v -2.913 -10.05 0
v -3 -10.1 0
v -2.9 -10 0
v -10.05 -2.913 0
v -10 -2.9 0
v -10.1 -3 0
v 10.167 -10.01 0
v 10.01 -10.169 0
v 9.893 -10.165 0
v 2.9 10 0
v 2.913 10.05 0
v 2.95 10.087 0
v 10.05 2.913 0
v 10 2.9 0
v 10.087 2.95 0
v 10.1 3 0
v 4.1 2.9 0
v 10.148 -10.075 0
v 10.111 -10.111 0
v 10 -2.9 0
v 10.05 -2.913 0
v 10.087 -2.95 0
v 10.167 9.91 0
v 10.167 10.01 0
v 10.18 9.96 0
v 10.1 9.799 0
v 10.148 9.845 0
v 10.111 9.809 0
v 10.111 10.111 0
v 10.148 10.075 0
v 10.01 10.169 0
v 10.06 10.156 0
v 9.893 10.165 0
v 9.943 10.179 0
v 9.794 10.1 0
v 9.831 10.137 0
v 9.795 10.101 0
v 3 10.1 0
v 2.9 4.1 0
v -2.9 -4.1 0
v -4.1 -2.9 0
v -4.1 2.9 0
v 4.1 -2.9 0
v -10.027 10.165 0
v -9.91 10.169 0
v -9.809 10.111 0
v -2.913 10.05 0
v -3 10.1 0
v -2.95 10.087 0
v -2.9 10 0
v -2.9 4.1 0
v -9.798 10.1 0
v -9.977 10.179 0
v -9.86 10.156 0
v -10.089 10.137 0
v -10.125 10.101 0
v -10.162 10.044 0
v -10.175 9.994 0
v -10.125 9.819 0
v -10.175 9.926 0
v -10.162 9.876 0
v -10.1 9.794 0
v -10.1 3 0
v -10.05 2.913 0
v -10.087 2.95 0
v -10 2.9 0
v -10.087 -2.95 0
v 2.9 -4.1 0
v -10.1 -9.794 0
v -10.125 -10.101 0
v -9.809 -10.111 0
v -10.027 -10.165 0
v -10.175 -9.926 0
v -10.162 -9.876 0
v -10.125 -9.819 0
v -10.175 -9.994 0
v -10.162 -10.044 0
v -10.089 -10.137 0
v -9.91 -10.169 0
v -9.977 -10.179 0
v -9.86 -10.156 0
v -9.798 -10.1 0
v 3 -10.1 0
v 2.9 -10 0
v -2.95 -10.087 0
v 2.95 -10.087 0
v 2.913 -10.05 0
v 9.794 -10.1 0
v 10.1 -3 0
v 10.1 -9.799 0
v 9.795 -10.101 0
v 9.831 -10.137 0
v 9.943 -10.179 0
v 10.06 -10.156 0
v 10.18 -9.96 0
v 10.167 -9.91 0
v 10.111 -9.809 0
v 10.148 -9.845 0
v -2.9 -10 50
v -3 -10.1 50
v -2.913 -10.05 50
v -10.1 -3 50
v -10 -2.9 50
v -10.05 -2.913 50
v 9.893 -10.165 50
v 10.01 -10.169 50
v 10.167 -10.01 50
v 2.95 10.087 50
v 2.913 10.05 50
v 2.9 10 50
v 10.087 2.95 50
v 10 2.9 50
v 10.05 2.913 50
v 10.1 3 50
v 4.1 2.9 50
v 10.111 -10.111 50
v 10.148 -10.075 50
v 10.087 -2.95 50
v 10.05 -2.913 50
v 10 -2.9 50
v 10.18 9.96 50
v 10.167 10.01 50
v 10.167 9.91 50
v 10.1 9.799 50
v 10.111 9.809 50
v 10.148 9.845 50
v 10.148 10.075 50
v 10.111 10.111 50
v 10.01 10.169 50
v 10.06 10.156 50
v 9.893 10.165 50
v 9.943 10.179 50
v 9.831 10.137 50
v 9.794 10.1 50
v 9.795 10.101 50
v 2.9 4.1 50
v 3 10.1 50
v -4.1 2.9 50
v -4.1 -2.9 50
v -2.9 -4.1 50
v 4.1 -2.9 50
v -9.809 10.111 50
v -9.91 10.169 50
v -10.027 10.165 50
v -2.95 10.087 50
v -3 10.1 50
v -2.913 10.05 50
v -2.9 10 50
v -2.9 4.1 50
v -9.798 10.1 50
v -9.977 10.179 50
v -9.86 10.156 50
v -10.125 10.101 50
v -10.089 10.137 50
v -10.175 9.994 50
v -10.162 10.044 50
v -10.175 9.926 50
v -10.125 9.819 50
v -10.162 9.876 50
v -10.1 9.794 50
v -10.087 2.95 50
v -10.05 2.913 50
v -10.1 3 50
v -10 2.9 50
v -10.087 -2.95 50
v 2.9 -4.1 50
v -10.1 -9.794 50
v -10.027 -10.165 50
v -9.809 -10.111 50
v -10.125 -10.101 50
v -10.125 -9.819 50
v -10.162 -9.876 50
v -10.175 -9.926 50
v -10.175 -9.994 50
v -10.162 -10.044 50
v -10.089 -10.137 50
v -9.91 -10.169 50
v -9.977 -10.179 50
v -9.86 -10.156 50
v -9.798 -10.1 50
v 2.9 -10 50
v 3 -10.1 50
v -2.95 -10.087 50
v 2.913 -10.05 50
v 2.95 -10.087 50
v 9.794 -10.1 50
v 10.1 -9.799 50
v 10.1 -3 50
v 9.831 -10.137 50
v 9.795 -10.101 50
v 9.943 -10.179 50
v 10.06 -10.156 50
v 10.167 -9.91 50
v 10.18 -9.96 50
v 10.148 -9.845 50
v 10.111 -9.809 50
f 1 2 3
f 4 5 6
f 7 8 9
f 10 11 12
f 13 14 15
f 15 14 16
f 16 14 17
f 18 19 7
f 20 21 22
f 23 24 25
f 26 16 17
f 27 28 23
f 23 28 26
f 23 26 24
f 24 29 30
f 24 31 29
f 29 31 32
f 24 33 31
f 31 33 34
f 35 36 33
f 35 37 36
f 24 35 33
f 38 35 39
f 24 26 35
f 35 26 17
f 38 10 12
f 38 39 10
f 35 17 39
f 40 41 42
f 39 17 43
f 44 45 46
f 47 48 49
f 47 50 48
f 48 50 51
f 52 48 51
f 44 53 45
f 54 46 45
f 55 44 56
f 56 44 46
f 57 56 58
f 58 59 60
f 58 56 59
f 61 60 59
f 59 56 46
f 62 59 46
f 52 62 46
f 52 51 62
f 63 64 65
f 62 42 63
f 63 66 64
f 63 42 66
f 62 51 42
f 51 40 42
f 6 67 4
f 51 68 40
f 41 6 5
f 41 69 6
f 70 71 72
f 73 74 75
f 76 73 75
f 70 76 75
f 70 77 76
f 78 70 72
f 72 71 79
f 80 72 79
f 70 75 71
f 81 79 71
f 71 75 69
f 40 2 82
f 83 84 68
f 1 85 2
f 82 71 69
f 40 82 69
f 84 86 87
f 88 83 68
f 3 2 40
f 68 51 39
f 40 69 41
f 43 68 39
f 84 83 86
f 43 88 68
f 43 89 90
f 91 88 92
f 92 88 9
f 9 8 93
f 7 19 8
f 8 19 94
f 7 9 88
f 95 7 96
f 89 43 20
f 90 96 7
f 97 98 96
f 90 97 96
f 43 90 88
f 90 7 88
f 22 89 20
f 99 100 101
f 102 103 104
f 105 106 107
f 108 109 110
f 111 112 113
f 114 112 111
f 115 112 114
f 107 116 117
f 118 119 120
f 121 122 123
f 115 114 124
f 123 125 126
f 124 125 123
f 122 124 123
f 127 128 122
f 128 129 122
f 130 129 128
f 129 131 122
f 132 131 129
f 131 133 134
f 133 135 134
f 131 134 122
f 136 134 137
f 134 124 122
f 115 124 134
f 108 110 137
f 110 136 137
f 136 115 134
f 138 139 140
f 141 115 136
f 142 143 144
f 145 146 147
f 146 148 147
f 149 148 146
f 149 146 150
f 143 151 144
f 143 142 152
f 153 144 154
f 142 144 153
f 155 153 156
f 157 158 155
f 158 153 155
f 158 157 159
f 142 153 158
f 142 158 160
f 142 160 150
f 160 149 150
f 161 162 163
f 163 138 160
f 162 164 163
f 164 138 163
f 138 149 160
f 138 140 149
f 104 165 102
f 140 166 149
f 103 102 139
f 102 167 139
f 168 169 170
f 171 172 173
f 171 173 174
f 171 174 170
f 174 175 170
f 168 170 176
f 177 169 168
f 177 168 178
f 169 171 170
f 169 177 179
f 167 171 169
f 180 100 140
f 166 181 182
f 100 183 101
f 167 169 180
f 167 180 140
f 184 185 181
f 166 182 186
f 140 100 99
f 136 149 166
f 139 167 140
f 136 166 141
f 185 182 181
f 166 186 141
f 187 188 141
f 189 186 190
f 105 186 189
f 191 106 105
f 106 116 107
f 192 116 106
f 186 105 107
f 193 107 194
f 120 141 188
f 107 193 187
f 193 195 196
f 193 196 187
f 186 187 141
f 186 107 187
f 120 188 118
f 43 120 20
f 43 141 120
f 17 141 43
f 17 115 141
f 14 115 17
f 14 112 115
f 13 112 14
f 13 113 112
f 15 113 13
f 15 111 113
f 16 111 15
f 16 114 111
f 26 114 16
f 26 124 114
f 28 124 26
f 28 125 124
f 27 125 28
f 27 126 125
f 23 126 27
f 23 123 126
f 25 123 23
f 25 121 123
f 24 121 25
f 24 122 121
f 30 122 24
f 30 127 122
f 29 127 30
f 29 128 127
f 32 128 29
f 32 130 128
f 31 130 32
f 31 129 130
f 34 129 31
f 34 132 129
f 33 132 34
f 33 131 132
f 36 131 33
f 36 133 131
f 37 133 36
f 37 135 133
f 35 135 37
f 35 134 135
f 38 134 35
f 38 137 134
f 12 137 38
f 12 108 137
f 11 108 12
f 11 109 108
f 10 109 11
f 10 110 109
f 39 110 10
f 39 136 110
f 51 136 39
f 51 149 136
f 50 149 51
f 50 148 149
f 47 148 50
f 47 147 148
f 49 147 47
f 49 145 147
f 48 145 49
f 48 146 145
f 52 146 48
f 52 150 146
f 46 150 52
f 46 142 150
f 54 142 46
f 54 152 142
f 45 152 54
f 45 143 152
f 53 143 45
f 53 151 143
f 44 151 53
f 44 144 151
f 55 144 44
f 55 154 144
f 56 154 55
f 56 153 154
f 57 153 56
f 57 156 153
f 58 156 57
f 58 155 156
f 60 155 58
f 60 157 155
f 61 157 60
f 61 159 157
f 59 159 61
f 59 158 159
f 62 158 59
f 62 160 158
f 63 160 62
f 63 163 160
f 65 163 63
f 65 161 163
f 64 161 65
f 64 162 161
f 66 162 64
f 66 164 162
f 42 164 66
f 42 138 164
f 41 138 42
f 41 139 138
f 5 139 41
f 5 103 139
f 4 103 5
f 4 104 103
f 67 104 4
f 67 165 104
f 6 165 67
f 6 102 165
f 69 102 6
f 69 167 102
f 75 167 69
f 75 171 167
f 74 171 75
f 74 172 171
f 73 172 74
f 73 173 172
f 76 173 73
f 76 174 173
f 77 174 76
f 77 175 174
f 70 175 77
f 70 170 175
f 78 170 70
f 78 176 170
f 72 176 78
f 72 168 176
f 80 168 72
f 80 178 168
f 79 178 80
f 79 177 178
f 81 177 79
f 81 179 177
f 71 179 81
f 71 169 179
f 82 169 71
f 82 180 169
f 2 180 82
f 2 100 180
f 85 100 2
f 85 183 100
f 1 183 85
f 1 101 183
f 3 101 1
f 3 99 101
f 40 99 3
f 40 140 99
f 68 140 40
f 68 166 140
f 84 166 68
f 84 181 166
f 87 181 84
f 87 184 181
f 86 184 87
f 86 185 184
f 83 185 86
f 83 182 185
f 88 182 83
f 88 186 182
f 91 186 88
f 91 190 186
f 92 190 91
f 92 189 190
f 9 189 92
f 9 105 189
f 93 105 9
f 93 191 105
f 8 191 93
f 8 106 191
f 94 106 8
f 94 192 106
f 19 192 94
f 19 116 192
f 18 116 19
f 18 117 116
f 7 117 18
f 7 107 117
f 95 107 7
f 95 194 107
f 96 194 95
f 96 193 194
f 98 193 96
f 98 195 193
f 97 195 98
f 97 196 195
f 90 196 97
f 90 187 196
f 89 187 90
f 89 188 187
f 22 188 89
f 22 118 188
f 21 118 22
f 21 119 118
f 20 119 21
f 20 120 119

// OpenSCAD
// cut-out model to fit 20mm extrusion

//ext20profile(.2);
ext20(50,0.2);

module ext20(len,fuzz=0,verbose=0) {
  if (fuzz == 0)
    linear_extrude(len) ext20profile();
  else if (fuzz > 0)
    linear_extrude(len) minkowski() {
      ext20profile(fuzz);
      circle(r=fuzz/2,$fn=12);
    }
  else linear_extrude(len) difference() {
    square([21,21],center=true);
    minkowski() {
      difference() {
        square([21,21],center=true);
        ext20profile(fuzz);
      }
      circle(r=-kerf/2,$fn=12);
    }
  }
}


// these are used (almost) exclusively for cutting out
module ext20profile(fuzz=0) {
w = 20;
cr = .3;  // radius of outside corner, actual 0.3mm
wall=2;  // outer wall, 2mm
slot=6;  // slot width
innerSquare=8;
innerBoreRadius = 3.55/2;

  // don't bother beveling corner.
  // these are (almost?) always for cut-outs.
  // we will add extra corner relief anyway
  //hull() for(x=[-1,1]) for(y=[-1,1])
  //  translate([x*(w/2-cr),y*(w/2-cr)])
  //    circle(r=cr,$fn=36);

  union() {
    difference() {
      square([w,w],center=true);

      square([w+1,slot],center=true);
      square([slot,w+1],center=true);
    }
    square([innerSquare,innerSquare],center=true);

    if(fuzz>0)  // add extra corner relief for cutouts
      for(x=[-1,1]) for(y=[-1,1])
        translate([x*(w/2-fuzz*.2),y*(w/2-fuzz*.2)])
          circle(r=fuzz*.6,$fn=11);
    
  }
}

/*
module ext20profile(kerf=0,verbose=0) {
w=20;
w2f = w/2 - 0.6*abs(kerf);  // offset to center of corner stress relief loop
rc = (abs(kerf) < 0.1) ? 0.2 : 2*abs(kerf);  // radius of corner releif loop
ro=1;
$fn=24;
  difference() {
    union() {
      square([w,w],center=true);
      if (kerf > 0) // extra clearance around corners
        for(i=[-1,1]) for(j=[-1,1]) // extra clearance around corners
          translate([w2f*i,w2f*j,0]) circle(r=rc,$fn=8);
    }

    for (a=[0:90:355]) {
       rotate([0,0,a])
          slotV20profile();
    }
    if (floor(verbose/2) % 2) circle(r=2);
  }
}
*/
